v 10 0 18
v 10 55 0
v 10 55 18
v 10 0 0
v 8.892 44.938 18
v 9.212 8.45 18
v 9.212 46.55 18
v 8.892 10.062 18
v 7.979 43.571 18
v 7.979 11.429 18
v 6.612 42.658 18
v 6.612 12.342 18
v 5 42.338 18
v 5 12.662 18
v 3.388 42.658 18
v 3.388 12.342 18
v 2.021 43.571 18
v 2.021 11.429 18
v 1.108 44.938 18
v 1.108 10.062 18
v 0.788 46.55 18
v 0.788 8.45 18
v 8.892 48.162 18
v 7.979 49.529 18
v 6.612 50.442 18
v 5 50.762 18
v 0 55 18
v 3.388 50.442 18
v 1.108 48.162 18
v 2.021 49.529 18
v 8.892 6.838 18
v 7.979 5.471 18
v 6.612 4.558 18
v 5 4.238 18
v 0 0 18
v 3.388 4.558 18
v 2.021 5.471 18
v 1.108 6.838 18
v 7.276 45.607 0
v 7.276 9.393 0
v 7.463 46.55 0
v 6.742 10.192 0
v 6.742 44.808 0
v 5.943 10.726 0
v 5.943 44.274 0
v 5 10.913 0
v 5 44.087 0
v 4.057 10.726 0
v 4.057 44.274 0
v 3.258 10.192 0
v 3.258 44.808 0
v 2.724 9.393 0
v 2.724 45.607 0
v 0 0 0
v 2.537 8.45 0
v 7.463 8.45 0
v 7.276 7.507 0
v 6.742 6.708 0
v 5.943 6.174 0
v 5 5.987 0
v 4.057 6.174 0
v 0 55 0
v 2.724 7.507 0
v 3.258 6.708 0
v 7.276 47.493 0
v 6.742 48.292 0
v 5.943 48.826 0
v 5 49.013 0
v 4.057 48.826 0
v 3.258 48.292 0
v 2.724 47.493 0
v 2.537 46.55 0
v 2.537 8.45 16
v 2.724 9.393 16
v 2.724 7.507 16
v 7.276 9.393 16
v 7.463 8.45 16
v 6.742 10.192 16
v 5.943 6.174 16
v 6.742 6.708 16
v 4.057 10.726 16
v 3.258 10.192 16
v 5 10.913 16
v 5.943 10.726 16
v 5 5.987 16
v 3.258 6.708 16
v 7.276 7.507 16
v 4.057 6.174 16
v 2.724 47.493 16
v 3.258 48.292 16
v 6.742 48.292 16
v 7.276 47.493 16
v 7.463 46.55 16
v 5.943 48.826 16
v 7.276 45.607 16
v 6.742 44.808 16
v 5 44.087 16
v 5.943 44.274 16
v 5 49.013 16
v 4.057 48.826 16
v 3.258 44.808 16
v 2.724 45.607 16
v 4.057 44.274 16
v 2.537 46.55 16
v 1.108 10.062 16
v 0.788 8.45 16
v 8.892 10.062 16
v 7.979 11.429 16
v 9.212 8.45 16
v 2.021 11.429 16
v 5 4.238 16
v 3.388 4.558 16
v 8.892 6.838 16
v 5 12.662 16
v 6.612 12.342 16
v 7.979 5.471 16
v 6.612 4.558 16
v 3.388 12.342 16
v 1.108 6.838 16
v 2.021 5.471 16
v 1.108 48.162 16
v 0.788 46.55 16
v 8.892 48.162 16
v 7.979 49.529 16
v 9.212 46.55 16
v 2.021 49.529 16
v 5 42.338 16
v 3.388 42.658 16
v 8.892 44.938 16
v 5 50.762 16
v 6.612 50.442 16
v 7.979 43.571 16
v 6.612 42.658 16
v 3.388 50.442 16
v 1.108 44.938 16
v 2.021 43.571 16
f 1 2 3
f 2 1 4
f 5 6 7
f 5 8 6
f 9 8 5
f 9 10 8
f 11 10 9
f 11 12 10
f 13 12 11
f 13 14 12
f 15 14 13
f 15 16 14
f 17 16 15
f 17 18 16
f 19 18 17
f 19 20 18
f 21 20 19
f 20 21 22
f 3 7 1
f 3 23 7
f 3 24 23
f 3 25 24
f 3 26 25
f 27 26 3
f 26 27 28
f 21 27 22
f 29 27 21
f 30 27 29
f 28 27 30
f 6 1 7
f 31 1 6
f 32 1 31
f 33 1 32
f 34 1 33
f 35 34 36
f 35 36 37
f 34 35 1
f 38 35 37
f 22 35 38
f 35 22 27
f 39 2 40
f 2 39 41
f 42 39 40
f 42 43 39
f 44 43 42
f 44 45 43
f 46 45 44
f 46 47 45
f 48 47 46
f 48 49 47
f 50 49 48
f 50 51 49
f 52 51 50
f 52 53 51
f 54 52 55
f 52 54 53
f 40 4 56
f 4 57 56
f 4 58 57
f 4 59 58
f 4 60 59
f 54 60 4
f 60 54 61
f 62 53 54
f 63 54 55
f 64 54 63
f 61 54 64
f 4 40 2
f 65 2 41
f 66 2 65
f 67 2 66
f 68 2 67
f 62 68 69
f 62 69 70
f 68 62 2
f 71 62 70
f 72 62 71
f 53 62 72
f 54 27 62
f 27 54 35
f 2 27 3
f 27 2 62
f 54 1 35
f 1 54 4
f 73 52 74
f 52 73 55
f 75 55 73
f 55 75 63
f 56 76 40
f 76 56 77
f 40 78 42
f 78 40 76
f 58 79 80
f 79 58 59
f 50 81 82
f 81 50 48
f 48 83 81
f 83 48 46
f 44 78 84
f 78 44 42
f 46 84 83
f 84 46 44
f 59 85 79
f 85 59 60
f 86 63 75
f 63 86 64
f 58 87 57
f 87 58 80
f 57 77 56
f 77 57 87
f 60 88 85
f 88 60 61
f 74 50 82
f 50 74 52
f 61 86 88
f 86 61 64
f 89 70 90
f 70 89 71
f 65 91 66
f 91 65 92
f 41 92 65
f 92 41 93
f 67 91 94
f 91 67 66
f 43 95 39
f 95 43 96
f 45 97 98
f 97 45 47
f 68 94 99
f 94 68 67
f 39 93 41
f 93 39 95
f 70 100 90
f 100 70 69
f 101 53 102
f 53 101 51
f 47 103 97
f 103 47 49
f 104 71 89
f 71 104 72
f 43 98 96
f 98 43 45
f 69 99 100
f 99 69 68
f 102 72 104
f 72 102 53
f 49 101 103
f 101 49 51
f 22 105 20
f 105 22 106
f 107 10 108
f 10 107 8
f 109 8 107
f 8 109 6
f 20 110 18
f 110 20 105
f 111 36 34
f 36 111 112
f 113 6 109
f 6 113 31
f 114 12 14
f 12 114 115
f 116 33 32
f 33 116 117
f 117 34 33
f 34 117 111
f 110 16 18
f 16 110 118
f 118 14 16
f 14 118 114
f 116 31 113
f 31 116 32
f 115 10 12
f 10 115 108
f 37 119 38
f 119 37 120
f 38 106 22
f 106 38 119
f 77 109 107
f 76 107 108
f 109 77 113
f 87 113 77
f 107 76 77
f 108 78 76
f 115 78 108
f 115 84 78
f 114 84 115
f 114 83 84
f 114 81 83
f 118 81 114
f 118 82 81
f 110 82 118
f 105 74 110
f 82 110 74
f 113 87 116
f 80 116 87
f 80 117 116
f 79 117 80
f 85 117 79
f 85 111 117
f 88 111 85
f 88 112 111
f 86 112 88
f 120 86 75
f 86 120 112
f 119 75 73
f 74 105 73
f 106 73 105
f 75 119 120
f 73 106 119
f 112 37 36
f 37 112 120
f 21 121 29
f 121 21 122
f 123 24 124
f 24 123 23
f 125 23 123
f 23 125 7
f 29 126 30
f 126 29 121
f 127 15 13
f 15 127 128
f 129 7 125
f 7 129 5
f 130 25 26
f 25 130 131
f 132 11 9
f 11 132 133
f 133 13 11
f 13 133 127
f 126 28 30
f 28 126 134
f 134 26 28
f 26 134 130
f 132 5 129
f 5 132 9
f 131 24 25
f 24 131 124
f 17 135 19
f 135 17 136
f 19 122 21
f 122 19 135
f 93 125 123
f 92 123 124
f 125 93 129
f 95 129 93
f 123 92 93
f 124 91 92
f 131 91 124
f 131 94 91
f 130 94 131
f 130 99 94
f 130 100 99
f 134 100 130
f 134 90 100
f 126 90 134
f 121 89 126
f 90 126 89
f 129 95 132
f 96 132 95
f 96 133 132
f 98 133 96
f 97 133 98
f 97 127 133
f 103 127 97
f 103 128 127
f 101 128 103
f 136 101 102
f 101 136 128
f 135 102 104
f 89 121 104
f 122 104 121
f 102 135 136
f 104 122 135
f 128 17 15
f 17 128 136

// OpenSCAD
// file: grid.scad
/* This module creates grids. */

module grid(
   gridX, 
   gridY, 
   borderX, 
   borderY, 
   meshSolid,    // width of solid part of grid
   meshSpace,    // width of space part of grid
   thickness) {  // z height 

   /* Calculate the size of the dimensions of the meshed area. */
   meshX=gridX-(borderX*2);
   meshY=gridY-(borderY*2);

   echo (meshX,  meshY);

   /* Calculate the number of lines in the meshed area. */
   nX=floor(meshX/(meshSolid+meshSpace));
   nY=floor(meshY/(meshSolid+meshSpace));
   gridSize = meshSolid + meshSpace;
   echo (nX, nY, gridSize);


   intersection () {

      union() {
         /* 
          *  Draw the border box centered. 
          */
         difference() {
            cube (size=[gridX,gridY,thickness+ 2], center=true);
            cube (size=[meshX,meshY,thickness+ 2], center=true);
         } /* enddifference */
         
      
         /* 
          *  Draw the grid centered. 
          */
      
         /* Draw the lines parallel to y axis. */
         translate([-1 * (meshSolid / 2), 0, -1 * (thickness / 2)])
            union() {
               for (i = [0 : ceil(nX / 2)]) {
                  translate([i*(meshSolid+meshSpace), -1 * (gridY / 2), 0]) 
                     cube(size=[meshSolid, gridY, thickness]);
               } /* endfor */
               for (i = [0 : ceil(nX / 2)]) {
                  translate([-1 * i*(meshSolid+meshSpace), -1 * (gridY / 2), 0]) 
                     cube(size=[meshSolid, gridY, thickness]);
               } /* endfor */
            } /* endunion */
         
         /* Draw the lines parallel to the x axis. */
         translate([0, -1 * (meshSolid / 2), -1 * (thickness / 2)])
            union() {
               for (i = [0 : ceil(nY / 2)]) {
                  translate([-1 * (gridX / 2), i*(meshSolid+meshSpace), 0]) 
                     cube(size=[gridX, meshSolid, thickness]);
               } /* endfor */
               for (i = [0 : ceil(nY / 2)]) {
                  translate([-1 * (gridX / 2), -1 * i*(meshSolid+meshSpace), 0]) 
                     cube(size=[gridX, meshSolid, thickness]);
               } /* endfor */
            } /* endunion */
      } /* endunion */

      /* Slice off all the extra line widths on the edges. */
      cube (size=[gridX,gridY,thickness], center=true);

   } /* endintersection */

} /* endmodule */


grid(21, 41, 0, 0, 2, 8, 5);
   
// main file
/* This is a jig for holding the rpi door controller PCB
   on a Sherline 5000 mill for isolation milling.  */
use <MCAD/nuts_and_bolts.scad>;
use <grid.scad>;

$fn = 16;

/* Set overall piece dimensions. */
x = 148;
y = 55;
z = 18;
x_border = 10;
y_border = 10;
grid_size = 20;
grid_line_width = 1;

/* The grid pocket is how much to drop the top of the grid by.  This
   allows for some padding to be added underneath the circuit board. */
grid_pocket = 3;


/* Set the screw size in mm. */
screw_size = 4.1;

/* 
 *  Set the mounting bolt dimensions. 
 */

/* Use a #10 socket head cap screw. */
bolt_dia = (0.19 * 25.4) + 0.1; 
bolt_head_dia = (0.312 * 25.4) + 0.5;   
bolt_head_height = 2;

/* Set the distance between mounting holes. */
mount_hole_dist = (1.5 * 25.4); // 1.5 in



/****** Calculated Values *******/
mount_hole_x_offset = x_border / 2; 


difference() {

   cube(size=[x_border, y, z]);
   
   /* 
    *  Add some holes for the #10 socket head cap screws that
    *  attach the plate to the base. 
    */
  

   /* Subtract the bolt holes. */
   translate([mount_hole_x_offset, 
              (y / 2) - (mount_hole_dist / 2), 
              0])
      cylinder(h = z, r = bolt_dia / 2);
   translate([mount_hole_x_offset, 
              (y / 2) + (mount_hole_dist / 2), 
              0])
      cylinder(h = z, r = bolt_dia / 2);



   /* Subtract the bolt head holes. */
   translate([mount_hole_x_offset, 
              (y / 2) - (mount_hole_dist / 2), 
              z - bolt_head_height])
      cylinder(h = z, r = bolt_head_dia / 2);
   translate([mount_hole_x_offset, 
              (y / 2) + (mount_hole_dist / 2), 
              z - bolt_head_height])
      cylinder(h = z, r = bolt_head_dia / 2);

} /* enddifference */
